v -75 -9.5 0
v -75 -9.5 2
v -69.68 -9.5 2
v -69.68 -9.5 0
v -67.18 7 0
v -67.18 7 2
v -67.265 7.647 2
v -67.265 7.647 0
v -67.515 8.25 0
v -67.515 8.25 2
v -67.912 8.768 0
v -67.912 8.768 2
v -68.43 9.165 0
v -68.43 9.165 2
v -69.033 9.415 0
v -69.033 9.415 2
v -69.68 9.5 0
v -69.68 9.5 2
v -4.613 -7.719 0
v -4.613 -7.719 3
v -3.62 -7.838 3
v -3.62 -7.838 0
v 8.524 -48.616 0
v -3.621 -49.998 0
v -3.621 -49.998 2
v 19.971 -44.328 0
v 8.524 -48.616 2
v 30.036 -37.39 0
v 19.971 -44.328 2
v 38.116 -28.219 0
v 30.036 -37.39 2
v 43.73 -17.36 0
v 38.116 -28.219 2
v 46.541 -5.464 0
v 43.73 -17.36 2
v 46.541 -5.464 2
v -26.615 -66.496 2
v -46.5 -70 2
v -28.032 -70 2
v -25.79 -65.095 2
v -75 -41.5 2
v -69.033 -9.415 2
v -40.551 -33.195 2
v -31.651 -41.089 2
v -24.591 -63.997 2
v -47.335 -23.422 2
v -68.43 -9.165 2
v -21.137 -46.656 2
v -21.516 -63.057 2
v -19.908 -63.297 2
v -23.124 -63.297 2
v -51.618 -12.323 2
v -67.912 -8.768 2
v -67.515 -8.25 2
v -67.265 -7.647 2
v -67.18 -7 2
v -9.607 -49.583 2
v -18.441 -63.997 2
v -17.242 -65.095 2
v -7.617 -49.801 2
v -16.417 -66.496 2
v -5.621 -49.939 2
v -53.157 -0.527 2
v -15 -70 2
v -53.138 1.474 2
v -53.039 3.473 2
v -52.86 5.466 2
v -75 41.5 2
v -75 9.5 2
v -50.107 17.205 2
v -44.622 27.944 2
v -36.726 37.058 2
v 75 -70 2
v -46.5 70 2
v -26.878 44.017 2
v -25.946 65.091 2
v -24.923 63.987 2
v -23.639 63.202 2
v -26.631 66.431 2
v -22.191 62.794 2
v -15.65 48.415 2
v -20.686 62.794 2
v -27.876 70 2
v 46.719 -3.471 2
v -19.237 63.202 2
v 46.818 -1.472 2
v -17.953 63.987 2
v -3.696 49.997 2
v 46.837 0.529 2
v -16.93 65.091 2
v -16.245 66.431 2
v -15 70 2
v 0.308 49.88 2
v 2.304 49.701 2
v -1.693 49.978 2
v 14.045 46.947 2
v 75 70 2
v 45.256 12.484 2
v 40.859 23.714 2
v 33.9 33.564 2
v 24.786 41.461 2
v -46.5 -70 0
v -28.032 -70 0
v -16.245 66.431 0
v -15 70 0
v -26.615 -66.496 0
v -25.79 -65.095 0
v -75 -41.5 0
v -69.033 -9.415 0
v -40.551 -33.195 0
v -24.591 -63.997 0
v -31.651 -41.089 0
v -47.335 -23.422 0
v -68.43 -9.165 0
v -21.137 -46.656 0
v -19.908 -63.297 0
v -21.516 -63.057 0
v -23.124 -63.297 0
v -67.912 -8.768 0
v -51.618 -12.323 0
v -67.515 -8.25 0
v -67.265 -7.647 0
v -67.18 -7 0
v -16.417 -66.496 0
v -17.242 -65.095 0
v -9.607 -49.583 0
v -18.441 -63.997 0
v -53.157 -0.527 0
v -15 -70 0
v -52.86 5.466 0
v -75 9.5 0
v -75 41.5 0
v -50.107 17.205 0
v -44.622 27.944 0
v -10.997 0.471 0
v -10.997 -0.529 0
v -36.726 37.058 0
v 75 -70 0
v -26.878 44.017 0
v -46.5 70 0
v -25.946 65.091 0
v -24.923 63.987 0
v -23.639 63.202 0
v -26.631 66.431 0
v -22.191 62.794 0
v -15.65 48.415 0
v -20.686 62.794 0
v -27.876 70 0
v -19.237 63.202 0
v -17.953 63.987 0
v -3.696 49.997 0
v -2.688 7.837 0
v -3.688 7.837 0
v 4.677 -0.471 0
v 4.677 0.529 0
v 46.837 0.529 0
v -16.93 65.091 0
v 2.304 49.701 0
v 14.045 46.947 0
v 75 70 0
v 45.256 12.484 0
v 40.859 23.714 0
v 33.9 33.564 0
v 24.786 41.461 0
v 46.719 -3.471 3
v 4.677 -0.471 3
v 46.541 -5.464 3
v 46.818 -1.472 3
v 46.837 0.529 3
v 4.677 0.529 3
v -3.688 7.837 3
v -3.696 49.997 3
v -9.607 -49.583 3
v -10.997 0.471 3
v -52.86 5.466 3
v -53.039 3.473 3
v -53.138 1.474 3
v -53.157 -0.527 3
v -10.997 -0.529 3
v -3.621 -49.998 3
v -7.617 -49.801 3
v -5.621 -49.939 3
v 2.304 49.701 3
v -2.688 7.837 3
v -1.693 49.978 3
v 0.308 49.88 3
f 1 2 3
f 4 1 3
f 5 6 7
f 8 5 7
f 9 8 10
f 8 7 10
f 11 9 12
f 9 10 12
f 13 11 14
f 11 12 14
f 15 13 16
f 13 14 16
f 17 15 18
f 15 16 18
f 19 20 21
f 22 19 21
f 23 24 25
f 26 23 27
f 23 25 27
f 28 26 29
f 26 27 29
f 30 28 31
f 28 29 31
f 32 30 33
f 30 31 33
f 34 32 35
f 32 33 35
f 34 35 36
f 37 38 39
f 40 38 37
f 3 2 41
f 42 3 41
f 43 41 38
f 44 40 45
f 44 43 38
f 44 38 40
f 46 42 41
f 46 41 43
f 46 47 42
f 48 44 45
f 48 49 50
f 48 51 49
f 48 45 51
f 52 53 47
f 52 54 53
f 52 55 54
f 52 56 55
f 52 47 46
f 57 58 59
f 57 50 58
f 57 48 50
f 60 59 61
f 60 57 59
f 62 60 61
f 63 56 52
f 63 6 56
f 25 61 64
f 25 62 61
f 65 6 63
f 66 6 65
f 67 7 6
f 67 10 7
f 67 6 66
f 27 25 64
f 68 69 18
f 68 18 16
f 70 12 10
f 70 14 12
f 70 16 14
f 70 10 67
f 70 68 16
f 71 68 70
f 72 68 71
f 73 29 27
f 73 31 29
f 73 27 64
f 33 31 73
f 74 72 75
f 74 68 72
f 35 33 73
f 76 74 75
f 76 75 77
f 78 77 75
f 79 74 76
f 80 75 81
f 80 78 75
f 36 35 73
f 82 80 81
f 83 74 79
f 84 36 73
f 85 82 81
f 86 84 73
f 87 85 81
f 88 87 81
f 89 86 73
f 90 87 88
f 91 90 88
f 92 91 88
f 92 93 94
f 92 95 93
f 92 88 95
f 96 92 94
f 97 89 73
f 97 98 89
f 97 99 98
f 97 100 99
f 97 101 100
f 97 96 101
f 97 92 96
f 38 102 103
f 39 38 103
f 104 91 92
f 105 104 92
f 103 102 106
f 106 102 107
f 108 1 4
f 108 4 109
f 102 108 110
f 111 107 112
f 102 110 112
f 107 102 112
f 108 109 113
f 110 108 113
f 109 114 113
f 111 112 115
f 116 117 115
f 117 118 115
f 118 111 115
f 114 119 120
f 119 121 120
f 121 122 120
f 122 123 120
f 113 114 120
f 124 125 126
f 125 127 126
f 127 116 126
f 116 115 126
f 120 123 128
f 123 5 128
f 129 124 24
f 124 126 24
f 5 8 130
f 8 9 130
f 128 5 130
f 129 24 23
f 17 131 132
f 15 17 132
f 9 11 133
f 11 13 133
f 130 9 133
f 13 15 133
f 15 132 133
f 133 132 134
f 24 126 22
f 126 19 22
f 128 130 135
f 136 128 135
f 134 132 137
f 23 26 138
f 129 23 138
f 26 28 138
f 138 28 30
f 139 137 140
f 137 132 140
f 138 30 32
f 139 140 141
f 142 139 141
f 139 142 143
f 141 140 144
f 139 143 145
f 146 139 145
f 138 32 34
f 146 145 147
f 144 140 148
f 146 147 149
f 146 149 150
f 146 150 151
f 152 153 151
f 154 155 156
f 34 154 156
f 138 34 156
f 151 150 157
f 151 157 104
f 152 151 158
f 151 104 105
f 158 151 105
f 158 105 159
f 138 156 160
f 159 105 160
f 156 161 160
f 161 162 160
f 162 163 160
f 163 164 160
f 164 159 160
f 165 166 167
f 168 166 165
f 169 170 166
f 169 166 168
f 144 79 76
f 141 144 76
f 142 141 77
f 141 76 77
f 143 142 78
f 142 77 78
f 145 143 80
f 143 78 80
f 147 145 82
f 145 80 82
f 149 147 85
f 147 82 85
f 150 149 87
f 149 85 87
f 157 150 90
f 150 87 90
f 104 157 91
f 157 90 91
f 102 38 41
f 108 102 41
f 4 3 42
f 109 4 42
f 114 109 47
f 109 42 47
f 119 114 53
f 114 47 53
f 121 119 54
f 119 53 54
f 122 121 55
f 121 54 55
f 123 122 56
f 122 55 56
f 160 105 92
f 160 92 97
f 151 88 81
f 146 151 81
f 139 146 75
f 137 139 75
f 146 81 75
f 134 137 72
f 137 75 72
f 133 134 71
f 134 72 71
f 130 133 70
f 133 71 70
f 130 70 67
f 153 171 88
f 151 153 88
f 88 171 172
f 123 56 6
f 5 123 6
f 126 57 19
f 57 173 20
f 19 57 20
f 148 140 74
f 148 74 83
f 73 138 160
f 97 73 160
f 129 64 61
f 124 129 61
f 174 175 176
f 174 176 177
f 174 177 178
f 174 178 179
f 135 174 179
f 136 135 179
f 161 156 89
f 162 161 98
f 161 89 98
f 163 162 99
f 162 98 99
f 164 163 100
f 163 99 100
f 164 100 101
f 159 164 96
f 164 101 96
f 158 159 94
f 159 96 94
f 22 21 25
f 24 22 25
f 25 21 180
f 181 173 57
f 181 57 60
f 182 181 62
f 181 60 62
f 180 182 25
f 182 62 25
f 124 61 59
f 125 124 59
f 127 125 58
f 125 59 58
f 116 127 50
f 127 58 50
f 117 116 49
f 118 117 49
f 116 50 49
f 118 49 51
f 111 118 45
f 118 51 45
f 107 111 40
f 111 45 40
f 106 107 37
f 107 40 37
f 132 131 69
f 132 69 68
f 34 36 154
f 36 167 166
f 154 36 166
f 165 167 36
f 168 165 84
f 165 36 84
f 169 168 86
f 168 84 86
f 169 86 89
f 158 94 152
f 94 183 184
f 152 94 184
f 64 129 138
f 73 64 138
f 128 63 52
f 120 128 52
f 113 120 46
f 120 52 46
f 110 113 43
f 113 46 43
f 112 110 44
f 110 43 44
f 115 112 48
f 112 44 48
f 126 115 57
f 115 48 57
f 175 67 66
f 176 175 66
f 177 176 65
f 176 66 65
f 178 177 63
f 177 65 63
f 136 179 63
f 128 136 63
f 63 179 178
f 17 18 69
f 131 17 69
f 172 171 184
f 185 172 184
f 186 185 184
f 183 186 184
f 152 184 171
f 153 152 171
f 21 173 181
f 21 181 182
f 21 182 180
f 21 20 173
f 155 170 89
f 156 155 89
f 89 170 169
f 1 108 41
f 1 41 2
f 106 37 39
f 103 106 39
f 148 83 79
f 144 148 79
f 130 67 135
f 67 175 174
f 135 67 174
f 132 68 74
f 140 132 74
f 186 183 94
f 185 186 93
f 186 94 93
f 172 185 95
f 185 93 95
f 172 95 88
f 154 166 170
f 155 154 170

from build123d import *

# Parameters (mm, degrees)
F0_W      = 150
F0_H      = 140
F1_DEPTH  = 2
F3_DEPTH  = 2.001
F5_DEPTH  = 2.001
F7_DEPTH  = 2.001
F8_R      = 50
F9_DEPTH  = 1
F11_DEPTH = 25


with BuildPart() as f1:
    # F0 (on Top) → F1 (new body)
    with BuildSketch(Plane.XY):
        Rectangle(F0_W, F0_H)
    extrude(amount=F1_DEPTH)

    # F2 (on face) → F3 (cut, through all)
    with BuildSketch(Plane.XY.offset(2)):
        Polygon((-75, 70), (-75, 41.5), (-46.5, 70), align=None)
        Polygon((-46.5, -70), (-75, -41.5), (-75, -70), align=None)
    extrude(amount=-F3_DEPTH, mode=Mode.SUBTRACT)

    # F4 (on face) → F5 (cut, through all)
    with BuildSketch(Plane.XY.offset(2)):
        with BuildLine():
            Line((-69.68, 9.5), (-75, 9.5))
            Line((-75, 9.5), (-75, -9.5))
            Line((-75, -9.5), (-69.68, -9.5))
            ThreePointArc((-69.68, -9.5), (-67.912233047, -8.767766953), (-67.18, -7))
            Line((-67.18, -7), (-67.18, 7))
            ThreePointArc((-67.18, 7), (-67.912233047, 8.767766953), (-69.68, 9.5))
        make_face()
    extrude(amount=-F5_DEPTH, mode=Mode.SUBTRACT)

    # F6 (on face) → F7 (cut, through all)
    with BuildSketch(Plane.XY.offset(2)):
        with BuildLine():
            Line((-28.0316714603, -70), (-15, -70))
            Line((-15, -70), (-16.4167693452, -66.4955507391))
            ThreePointArc((-16.4167693452, -66.4955507391), (-21.5158357302, -63.056987617), (-26.6149021151, -66.4955507391))
            Line((-26.6149021151, -66.4955507391), (-28.0316714603, -70))
        make_face()
        with BuildLine():
            Line((-27.8761372256, 70), (-26.6312305576, 66.430881427))
            ThreePointArc((-26.6312305576, 66.430881427), (-21.4380686128, 62.742253563), (-16.244906668, 66.430881427))
            Line((-16.244906668, 66.430881427), (-15, 70))
            Line((-15, 70), (-27.8761372256, 70))
        make_face()
    extrude(amount=-F7_DEPTH, mode=Mode.SUBTRACT)

    # F8 (on face) → F9 (join)
    with BuildSketch(Plane.XY.offset(2)):
        with Locations((-3.16, 0)):
            Circle(F8_R)
    extrude(amount=F9_DEPTH)

    # F10 (on face) → F11 (cut)
    with BuildSketch(Plane.XY.offset(3)):
        with BuildLine():
            Line((-3.6879379587, 7.8371274476), (-3.6960266549, 49.9971266717))
            ThreePointArc((-3.6960266549, 49.9971266717), (-36.7261918512, 37.05820779), (-52.8603788952, 5.4655592283))
            Line((-52.8603788952, 5.4655592283), (-10.9972216764, 0.4713958675))
            Line((-10.9972216764, 0.4713958675), (-10.9972216764, -0.5286041325))
            Line((-10.9972216764, -0.5286041325), (-53.1572216493, -0.5270933046))
            ThreePointArc((-53.1572216493, -0.5270933046), (-40.550995441, -33.1950818636), (-9.6065138215, -49.5826830612))
            Line((-9.6065138215, -49.5826830612), (-4.6131023208, -7.7194361544))
            Line((-4.6131023208, -7.7194361544), (-3.6201410564, -7.8378757061))
            Line((-3.6201410564, -7.8378757061), (-3.6208964704, -49.9978756993))
            ThreePointArc((-3.6208964704, -49.9978756993), (30.0356406829, -37.3904993234), (46.5405422428, -5.4640736429))
            Line((46.5405422428, -5.4640736429), (4.6772058717, -0.4714122399))
            Line((4.6772058717, -0.4714122399), (4.6772058717, 0.5285877601))
            Line((4.6772058717, 0.5285877601), (46.8372058717, 0.5285877601))
            ThreePointArc((46.8372058717, 0.5285877601), (33.9001692932, 33.5640261584), (2.3039733451, 49.7005532694))
            Line((2.3039733451, 49.7005532694), (-2.6879379587, 7.8371274476))
            Line((-2.6879379587, 7.8371274476), (-3.6879379587, 7.8371274476))
        make_face()
    extrude(amount=-F11_DEPTH, mode=Mode.SUBTRACT)


solid = f1.part
